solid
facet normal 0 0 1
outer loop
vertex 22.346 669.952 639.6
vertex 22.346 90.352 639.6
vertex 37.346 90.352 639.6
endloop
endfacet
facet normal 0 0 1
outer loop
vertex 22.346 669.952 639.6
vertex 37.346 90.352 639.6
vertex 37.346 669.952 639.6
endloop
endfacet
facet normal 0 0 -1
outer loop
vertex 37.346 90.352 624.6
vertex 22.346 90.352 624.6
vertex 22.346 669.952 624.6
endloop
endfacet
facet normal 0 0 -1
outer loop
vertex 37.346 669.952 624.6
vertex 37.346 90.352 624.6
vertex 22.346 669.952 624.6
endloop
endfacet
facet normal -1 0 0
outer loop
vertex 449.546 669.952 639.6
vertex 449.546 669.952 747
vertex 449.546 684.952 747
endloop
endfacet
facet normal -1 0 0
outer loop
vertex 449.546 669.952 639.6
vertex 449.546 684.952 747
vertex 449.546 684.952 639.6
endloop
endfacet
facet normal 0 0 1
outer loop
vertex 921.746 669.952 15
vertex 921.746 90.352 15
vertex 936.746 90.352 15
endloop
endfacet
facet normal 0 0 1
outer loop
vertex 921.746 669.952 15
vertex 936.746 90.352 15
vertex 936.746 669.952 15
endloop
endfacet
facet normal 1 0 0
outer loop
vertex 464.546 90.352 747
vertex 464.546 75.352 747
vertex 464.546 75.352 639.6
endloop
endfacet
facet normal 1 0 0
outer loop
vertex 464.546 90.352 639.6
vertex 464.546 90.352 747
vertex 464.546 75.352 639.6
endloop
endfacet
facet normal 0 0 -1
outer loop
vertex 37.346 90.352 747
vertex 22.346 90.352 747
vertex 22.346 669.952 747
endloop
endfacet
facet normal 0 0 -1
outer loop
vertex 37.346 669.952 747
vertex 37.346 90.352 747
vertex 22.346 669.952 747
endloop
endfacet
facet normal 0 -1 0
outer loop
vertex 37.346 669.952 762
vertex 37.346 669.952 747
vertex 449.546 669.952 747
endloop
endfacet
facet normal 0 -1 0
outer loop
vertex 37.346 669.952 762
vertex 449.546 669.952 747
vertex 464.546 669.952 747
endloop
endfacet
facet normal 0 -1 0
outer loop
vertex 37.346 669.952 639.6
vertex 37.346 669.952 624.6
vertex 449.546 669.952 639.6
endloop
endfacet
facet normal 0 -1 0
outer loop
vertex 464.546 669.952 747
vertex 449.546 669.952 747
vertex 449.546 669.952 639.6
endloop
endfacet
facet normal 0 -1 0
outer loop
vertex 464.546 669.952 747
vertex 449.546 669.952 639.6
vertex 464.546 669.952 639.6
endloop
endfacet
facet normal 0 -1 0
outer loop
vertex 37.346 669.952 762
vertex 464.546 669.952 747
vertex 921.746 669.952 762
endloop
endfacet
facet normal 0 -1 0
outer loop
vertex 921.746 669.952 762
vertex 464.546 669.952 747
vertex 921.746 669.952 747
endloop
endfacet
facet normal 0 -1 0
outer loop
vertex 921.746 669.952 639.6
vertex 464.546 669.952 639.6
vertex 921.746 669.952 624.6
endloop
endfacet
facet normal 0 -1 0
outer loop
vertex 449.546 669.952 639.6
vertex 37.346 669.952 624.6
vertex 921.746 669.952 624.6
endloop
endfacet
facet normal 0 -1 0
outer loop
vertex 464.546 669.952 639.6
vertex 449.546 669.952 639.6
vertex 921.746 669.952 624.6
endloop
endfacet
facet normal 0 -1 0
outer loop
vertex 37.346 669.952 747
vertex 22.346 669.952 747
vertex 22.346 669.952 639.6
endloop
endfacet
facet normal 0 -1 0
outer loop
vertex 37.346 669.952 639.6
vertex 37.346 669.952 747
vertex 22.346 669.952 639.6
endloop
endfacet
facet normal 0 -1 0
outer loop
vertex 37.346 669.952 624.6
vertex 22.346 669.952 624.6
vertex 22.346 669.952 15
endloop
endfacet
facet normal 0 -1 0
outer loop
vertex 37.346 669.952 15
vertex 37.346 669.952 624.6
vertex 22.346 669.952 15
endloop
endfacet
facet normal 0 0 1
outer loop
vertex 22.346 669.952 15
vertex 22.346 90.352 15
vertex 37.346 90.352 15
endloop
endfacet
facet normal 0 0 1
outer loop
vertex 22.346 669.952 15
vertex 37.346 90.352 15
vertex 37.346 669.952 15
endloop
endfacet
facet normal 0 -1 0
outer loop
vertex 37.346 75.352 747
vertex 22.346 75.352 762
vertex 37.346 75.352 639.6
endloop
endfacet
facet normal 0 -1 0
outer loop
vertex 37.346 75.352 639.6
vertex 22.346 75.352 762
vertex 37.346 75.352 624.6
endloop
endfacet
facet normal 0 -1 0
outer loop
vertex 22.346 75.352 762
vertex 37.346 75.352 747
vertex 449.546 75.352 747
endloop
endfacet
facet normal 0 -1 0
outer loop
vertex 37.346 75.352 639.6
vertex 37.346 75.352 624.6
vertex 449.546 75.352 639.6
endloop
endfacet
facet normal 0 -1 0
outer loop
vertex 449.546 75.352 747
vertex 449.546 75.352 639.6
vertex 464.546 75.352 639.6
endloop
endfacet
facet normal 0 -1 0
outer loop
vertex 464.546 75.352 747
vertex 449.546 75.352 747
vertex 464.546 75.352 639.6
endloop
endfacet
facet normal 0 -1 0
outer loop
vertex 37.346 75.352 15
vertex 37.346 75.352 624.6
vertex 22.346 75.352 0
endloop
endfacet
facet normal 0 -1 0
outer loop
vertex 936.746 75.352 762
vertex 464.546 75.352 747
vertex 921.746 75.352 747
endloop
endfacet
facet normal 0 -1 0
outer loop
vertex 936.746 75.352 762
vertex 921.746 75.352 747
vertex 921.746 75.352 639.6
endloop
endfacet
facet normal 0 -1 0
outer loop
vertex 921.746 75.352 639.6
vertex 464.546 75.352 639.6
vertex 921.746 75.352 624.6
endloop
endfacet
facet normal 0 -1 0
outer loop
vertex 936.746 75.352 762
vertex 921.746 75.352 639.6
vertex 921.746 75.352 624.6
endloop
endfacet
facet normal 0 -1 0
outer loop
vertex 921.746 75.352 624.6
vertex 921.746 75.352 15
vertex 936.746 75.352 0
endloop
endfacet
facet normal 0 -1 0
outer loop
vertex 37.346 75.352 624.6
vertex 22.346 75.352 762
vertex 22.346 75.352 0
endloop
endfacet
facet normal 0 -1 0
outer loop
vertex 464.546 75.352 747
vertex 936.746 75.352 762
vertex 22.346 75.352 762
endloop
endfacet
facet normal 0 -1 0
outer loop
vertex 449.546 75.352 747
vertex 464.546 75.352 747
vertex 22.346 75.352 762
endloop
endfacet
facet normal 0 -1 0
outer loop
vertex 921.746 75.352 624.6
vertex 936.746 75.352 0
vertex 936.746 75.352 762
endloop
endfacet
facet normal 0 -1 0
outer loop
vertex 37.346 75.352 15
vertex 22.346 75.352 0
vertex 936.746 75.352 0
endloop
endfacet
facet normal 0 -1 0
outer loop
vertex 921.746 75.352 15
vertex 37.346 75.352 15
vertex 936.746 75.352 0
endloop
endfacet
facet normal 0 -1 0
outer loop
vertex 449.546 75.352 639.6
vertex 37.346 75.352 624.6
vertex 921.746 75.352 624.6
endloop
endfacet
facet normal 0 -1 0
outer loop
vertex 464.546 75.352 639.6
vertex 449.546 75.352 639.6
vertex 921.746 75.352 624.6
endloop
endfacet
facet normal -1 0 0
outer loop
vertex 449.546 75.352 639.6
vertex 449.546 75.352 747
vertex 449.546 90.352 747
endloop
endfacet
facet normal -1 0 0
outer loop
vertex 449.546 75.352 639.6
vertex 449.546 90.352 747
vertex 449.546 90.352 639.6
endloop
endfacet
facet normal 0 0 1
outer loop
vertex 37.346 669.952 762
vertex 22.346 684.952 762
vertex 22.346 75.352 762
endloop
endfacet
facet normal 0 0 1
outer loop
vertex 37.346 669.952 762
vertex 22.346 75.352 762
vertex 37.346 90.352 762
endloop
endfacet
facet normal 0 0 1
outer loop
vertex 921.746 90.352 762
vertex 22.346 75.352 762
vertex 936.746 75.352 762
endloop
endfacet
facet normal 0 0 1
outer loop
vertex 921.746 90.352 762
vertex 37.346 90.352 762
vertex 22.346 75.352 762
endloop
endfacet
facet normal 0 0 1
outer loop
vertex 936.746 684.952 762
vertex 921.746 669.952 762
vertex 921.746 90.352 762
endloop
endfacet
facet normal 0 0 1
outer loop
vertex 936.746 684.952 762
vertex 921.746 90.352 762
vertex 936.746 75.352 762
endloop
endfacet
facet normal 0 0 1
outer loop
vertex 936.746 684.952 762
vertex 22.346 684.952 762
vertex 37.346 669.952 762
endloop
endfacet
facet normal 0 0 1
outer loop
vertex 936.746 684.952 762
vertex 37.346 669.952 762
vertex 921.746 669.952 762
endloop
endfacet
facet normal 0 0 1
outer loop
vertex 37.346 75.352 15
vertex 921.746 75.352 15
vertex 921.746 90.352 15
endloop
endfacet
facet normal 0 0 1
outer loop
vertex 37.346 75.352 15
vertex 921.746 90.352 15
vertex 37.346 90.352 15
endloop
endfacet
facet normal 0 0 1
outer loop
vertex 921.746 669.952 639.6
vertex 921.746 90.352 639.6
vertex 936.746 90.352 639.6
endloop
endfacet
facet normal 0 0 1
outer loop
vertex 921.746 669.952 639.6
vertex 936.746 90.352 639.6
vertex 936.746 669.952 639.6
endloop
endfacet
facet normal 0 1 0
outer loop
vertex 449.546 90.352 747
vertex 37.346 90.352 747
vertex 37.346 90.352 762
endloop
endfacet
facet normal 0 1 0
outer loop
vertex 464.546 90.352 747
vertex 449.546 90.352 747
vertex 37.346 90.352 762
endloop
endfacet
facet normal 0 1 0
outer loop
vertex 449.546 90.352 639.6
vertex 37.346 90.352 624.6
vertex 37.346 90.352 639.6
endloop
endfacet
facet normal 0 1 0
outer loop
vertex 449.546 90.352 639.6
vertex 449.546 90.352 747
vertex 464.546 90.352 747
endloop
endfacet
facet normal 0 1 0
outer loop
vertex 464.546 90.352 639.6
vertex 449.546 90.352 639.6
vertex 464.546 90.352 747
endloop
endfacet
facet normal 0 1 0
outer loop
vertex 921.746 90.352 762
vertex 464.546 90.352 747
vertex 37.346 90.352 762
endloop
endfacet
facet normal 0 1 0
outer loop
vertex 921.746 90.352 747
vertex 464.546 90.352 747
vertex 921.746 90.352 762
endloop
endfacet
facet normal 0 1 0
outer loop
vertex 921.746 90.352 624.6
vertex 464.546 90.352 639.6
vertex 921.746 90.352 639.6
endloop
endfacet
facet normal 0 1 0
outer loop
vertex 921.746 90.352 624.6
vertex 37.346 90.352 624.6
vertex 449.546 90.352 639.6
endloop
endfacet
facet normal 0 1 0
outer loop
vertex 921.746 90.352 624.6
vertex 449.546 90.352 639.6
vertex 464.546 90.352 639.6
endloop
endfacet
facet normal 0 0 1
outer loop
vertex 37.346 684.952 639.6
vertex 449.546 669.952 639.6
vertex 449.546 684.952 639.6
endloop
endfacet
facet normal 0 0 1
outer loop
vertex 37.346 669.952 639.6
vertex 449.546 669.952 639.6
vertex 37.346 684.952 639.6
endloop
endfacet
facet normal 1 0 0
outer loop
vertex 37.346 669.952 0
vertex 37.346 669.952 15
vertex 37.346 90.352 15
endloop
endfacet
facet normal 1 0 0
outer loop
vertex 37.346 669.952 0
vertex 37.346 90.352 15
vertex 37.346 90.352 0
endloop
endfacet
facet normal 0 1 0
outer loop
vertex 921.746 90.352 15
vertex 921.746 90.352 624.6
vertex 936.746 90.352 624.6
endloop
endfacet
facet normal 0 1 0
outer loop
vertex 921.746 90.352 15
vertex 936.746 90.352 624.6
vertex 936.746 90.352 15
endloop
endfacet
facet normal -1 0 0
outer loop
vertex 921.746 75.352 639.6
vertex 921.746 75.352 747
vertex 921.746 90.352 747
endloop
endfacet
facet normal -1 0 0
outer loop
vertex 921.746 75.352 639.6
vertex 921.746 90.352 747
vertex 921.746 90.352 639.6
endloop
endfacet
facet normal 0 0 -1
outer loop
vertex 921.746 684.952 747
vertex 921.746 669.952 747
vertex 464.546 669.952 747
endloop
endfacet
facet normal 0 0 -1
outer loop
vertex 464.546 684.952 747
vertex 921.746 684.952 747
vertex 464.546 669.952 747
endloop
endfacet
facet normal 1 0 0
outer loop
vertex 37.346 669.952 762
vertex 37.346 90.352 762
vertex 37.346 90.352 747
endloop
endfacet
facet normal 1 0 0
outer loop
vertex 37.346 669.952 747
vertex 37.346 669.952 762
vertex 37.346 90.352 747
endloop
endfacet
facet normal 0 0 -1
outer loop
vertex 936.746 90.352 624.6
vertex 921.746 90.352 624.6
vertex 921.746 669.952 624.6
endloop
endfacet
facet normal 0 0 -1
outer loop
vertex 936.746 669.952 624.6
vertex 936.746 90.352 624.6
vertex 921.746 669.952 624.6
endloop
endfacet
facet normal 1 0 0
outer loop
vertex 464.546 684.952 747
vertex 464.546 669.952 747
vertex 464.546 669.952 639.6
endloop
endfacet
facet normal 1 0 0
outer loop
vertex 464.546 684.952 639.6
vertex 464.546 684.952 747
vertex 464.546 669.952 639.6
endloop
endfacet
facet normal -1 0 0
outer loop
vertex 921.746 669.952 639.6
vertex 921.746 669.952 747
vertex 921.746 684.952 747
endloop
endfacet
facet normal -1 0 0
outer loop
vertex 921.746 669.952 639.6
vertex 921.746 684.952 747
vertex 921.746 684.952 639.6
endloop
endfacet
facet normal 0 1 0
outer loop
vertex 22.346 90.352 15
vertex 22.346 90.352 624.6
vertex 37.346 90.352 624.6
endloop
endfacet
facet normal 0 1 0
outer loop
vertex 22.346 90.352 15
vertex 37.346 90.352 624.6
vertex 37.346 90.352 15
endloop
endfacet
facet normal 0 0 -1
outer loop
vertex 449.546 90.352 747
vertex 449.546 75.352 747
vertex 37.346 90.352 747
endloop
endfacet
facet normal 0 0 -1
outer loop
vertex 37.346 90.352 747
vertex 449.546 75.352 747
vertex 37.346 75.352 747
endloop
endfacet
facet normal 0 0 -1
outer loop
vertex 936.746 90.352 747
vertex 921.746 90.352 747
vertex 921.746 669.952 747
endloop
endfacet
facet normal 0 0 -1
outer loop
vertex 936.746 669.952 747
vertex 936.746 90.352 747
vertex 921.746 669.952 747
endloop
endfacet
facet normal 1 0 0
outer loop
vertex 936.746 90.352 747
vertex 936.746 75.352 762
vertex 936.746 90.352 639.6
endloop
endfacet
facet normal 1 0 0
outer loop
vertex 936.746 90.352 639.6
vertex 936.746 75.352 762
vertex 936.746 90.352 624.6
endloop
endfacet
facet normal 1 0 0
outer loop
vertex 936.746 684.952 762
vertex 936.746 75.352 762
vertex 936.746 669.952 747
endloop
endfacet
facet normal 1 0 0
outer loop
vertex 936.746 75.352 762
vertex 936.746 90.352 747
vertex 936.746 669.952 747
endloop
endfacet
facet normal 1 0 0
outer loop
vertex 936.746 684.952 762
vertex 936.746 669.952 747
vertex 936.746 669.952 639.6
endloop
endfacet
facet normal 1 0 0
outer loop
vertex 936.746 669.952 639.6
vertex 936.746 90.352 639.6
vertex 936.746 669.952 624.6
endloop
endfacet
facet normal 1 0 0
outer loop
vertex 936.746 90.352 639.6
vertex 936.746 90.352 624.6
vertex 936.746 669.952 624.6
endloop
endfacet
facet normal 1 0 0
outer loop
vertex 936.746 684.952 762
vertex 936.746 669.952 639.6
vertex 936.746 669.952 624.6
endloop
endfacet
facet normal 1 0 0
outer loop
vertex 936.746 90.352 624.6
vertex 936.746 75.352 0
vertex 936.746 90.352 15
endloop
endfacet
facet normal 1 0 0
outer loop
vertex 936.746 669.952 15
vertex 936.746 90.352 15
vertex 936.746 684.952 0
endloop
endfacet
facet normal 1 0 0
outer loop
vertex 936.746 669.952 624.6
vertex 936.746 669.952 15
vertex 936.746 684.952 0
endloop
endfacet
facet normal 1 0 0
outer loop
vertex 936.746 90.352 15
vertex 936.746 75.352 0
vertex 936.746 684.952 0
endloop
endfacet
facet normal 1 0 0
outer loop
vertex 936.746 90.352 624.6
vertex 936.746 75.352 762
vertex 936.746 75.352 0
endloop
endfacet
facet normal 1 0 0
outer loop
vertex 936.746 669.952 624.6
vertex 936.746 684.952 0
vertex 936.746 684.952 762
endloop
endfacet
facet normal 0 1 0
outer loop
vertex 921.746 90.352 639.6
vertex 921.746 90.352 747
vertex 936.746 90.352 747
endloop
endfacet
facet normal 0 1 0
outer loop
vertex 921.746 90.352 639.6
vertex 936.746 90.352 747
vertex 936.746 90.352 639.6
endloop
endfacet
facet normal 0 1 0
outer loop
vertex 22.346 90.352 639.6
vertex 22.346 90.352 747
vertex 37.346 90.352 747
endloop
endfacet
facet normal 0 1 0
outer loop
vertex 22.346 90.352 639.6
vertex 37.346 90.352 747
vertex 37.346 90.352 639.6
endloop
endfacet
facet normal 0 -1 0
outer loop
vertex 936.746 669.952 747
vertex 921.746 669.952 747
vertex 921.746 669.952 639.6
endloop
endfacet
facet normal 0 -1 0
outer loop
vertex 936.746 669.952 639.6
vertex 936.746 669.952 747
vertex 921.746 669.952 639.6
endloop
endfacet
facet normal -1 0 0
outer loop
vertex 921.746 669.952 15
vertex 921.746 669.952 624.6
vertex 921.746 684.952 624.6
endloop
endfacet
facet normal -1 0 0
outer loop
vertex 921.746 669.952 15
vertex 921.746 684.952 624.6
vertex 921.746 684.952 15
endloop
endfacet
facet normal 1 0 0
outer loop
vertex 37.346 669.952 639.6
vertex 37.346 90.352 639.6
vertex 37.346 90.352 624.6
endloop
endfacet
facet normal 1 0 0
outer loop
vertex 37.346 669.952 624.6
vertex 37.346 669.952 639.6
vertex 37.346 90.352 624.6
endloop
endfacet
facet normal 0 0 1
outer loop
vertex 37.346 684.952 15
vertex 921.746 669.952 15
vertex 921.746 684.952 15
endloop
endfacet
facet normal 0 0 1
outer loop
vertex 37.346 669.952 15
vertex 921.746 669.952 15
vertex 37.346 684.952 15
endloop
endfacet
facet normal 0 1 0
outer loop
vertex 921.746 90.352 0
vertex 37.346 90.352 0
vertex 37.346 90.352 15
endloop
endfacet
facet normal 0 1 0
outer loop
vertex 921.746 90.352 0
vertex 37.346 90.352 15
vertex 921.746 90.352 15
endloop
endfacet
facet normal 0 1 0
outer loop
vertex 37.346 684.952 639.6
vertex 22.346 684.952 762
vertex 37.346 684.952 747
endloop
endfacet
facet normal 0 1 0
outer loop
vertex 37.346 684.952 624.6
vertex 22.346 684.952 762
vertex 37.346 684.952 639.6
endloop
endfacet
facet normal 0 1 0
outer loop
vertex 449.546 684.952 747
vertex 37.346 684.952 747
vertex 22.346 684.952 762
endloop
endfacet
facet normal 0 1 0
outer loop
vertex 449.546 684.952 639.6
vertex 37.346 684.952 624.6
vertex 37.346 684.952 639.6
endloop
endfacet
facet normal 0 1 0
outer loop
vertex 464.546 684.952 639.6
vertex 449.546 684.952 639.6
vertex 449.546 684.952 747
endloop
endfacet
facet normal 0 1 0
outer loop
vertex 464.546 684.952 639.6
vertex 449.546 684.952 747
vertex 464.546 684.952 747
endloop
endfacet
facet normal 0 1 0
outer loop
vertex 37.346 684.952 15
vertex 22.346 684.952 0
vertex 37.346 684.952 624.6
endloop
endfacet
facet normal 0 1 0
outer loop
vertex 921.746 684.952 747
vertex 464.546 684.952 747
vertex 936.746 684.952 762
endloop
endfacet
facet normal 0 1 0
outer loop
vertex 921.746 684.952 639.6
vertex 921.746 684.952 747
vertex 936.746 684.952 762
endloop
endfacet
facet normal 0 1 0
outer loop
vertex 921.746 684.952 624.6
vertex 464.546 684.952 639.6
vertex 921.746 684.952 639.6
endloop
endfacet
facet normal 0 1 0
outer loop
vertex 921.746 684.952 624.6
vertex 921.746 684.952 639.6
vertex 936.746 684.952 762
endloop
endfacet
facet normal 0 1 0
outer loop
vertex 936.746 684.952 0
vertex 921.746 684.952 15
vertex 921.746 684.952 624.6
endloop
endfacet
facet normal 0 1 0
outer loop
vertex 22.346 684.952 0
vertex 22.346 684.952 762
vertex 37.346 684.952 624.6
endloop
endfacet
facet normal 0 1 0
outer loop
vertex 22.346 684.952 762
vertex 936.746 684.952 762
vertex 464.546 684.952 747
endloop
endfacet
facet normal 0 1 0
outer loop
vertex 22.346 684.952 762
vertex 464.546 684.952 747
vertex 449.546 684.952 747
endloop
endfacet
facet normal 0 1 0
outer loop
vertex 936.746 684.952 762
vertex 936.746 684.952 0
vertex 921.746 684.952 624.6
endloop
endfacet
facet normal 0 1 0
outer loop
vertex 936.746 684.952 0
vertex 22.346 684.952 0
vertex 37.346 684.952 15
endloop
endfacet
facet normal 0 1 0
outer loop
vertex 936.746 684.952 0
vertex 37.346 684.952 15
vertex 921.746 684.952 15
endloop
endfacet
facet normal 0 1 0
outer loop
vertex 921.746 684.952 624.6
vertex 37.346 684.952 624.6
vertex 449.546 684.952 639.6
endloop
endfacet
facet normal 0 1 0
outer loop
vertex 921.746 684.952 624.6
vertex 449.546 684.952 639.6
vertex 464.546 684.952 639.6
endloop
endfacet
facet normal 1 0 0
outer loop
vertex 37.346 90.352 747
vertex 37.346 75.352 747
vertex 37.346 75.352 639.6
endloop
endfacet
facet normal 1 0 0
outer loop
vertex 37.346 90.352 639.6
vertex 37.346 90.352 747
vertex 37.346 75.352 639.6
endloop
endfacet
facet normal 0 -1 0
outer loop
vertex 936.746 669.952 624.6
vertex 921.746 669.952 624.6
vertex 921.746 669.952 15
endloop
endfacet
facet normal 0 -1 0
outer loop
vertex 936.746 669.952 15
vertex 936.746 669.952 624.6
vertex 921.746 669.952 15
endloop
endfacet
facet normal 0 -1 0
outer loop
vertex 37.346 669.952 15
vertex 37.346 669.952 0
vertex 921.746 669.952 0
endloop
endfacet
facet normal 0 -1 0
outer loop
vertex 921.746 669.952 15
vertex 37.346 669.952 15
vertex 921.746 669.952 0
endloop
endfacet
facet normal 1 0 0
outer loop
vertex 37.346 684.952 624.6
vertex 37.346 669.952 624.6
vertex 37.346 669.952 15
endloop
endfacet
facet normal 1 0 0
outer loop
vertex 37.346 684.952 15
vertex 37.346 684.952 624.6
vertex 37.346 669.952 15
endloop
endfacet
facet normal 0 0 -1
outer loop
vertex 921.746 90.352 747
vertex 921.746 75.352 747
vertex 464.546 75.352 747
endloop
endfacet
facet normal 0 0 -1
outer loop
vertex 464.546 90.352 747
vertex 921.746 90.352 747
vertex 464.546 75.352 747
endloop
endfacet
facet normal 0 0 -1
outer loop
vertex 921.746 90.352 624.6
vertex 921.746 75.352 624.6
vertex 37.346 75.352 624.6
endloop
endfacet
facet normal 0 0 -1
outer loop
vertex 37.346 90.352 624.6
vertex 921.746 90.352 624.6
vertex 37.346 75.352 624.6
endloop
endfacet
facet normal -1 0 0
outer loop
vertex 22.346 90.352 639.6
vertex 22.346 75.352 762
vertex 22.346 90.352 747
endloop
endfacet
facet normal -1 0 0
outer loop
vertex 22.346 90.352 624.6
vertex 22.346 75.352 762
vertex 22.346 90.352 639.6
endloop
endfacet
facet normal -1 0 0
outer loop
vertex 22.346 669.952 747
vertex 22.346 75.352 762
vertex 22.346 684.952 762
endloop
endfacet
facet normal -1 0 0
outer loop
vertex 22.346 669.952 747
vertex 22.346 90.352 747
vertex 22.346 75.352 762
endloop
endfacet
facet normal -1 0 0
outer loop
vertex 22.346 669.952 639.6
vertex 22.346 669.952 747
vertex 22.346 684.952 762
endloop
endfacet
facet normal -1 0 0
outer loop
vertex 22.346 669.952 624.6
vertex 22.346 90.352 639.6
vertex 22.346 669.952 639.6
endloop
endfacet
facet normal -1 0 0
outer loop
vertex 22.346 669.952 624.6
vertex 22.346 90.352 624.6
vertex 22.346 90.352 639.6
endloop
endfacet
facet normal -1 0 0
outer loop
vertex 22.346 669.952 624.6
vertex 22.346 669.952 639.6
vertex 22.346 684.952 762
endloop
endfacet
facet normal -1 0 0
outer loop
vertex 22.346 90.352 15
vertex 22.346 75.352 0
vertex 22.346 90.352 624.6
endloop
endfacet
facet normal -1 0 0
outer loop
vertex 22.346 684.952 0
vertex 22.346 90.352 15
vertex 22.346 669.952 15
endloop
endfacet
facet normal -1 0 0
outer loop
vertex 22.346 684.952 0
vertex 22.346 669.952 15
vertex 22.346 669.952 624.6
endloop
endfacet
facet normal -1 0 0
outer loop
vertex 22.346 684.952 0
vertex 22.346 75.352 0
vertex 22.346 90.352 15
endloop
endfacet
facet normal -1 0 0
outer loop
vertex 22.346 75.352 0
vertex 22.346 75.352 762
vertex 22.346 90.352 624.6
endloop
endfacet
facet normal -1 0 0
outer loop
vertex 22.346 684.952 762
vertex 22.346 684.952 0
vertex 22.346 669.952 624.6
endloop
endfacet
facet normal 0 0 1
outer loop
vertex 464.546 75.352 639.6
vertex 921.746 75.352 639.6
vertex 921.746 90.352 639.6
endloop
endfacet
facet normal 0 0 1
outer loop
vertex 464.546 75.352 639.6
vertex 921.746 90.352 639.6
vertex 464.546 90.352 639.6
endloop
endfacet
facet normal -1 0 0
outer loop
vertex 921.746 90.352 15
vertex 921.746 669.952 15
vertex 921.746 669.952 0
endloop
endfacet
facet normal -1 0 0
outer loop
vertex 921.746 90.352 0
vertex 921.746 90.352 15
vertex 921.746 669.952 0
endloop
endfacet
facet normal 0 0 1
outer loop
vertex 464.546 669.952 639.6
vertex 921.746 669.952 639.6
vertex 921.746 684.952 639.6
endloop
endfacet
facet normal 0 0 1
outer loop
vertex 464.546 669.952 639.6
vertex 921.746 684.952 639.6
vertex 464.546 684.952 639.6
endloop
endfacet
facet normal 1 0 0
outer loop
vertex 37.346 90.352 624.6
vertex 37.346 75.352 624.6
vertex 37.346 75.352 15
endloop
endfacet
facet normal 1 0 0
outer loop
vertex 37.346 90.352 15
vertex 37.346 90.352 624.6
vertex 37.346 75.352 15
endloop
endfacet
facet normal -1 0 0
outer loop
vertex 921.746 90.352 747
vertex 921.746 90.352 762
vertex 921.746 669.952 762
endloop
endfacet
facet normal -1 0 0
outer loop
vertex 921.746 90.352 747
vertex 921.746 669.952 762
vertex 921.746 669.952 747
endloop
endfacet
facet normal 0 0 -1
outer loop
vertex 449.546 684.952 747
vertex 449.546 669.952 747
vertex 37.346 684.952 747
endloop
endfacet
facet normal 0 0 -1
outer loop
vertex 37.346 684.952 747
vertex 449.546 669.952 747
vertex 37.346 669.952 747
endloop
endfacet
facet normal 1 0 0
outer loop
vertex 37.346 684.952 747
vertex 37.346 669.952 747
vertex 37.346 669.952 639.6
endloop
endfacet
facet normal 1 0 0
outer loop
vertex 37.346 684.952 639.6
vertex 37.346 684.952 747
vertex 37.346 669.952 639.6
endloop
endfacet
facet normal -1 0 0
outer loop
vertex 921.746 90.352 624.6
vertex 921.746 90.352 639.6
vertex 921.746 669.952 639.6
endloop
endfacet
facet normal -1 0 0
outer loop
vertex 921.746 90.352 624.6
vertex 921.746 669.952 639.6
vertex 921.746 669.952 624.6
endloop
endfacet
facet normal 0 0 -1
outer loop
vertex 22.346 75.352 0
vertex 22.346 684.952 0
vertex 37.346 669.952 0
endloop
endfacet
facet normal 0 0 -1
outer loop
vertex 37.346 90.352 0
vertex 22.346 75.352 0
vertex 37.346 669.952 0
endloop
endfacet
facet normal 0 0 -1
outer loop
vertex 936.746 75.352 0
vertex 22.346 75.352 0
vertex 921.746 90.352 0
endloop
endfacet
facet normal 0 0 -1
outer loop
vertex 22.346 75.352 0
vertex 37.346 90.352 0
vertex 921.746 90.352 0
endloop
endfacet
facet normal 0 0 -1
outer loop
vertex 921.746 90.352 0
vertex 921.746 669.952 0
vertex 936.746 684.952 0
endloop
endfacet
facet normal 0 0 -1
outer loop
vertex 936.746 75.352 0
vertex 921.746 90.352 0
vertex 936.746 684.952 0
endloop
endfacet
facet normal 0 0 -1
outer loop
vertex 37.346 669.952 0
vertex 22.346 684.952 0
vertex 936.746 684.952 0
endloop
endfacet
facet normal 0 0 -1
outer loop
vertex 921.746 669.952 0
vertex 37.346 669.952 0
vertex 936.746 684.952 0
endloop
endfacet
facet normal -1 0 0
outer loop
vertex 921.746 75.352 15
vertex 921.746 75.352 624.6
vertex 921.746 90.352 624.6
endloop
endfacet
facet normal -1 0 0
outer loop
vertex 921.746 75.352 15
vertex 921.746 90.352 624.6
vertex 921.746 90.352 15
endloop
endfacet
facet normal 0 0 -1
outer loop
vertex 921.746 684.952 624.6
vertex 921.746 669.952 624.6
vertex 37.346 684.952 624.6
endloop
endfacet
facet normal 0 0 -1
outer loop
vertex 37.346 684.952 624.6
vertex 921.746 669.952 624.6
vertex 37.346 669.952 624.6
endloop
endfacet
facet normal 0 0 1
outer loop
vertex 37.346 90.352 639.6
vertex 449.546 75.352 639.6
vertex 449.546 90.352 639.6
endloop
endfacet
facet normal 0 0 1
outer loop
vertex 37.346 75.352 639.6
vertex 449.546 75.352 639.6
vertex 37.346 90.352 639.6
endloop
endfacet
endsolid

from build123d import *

# Parameters (mm, degrees)
SKETCH1_W               = 914.4
SKETCH1_H               = 609.6
SKETCH1_W_2             = 884.4
SKETCH1_H_2             = 579.6
BOSS_EXTRUDE2_DEPTH     = 762
SKETCH4_W               = 884.4
SKETCH4_H               = 609.6
SKETCH4_W_2             = 412.2
SKETCH4_H_2             = 107.4
SKETCH4_W_3             = 457.2
CUT_EXTRUDE3_DEPTH      = 762
CUT_EXTRUDE4_DEPTH      = 1374.291942344
CUT_EXTRUDE4_DEPTH_BACK = 1374.291942344
SKETCH5_W               = 107.4
SKETCH5_H               = 579.6
SKETCH5_W_2             = 609.6


with BuildPart() as part:
    # Sketch1 → Boss-Extrude2 (new body)
    with BuildSketch(Plane.XY):
        with Locations((479.545925455, 380.152114317)):
            Rectangle(SKETCH1_W, SKETCH1_H)
        with Locations((479.545925455, 380.152114317)):
            Rectangle(SKETCH1_W_2, SKETCH1_H_2, mode=Mode.SUBTRACT)
    extrude(amount=BOSS_EXTRUDE2_DEPTH)

    # Sketch4 → Cut-Extrude3 (cut)
    with BuildSketch(Plane(origin=(0, 75.352114317, 0), x_dir=(-1, 0, 0), z_dir=(0, -1, 0))):
        with Locations((-479.545925455, -319.8)):
            Rectangle(SKETCH4_W, SKETCH4_H)
        with Locations((-243.445925455, -693.3)):
            Rectangle(SKETCH4_W_2, SKETCH4_H_2)
        with Locations((-693.145925455, -693.3)):
            Rectangle(SKETCH4_W_3, SKETCH4_H_2)
    extrude(amount=-CUT_EXTRUDE3_DEPTH, mode=Mode.SUBTRACT)

    # Sketch5 → Cut-Extrude4 (cut, two sides: drawn at the far end of the back side and taken through both)
    with BuildSketch(Plane(origin=(936.745925455, 0, 0), x_dir=(0, 0, -1), z_dir=(1, 0, 0)).offset(-CUT_EXTRUDE4_DEPTH_BACK)):
        with Locations((-693.3, 380.152114317)):
            Rectangle(SKETCH5_W, SKETCH5_H)
        with Locations((-319.8, 380.152114317)):
            Rectangle(SKETCH5_W_2, SKETCH5_H)
    extrude(amount=CUT_EXTRUDE4_DEPTH + CUT_EXTRUDE4_DEPTH_BACK, mode=Mode.SUBTRACT)


solid = part.part
